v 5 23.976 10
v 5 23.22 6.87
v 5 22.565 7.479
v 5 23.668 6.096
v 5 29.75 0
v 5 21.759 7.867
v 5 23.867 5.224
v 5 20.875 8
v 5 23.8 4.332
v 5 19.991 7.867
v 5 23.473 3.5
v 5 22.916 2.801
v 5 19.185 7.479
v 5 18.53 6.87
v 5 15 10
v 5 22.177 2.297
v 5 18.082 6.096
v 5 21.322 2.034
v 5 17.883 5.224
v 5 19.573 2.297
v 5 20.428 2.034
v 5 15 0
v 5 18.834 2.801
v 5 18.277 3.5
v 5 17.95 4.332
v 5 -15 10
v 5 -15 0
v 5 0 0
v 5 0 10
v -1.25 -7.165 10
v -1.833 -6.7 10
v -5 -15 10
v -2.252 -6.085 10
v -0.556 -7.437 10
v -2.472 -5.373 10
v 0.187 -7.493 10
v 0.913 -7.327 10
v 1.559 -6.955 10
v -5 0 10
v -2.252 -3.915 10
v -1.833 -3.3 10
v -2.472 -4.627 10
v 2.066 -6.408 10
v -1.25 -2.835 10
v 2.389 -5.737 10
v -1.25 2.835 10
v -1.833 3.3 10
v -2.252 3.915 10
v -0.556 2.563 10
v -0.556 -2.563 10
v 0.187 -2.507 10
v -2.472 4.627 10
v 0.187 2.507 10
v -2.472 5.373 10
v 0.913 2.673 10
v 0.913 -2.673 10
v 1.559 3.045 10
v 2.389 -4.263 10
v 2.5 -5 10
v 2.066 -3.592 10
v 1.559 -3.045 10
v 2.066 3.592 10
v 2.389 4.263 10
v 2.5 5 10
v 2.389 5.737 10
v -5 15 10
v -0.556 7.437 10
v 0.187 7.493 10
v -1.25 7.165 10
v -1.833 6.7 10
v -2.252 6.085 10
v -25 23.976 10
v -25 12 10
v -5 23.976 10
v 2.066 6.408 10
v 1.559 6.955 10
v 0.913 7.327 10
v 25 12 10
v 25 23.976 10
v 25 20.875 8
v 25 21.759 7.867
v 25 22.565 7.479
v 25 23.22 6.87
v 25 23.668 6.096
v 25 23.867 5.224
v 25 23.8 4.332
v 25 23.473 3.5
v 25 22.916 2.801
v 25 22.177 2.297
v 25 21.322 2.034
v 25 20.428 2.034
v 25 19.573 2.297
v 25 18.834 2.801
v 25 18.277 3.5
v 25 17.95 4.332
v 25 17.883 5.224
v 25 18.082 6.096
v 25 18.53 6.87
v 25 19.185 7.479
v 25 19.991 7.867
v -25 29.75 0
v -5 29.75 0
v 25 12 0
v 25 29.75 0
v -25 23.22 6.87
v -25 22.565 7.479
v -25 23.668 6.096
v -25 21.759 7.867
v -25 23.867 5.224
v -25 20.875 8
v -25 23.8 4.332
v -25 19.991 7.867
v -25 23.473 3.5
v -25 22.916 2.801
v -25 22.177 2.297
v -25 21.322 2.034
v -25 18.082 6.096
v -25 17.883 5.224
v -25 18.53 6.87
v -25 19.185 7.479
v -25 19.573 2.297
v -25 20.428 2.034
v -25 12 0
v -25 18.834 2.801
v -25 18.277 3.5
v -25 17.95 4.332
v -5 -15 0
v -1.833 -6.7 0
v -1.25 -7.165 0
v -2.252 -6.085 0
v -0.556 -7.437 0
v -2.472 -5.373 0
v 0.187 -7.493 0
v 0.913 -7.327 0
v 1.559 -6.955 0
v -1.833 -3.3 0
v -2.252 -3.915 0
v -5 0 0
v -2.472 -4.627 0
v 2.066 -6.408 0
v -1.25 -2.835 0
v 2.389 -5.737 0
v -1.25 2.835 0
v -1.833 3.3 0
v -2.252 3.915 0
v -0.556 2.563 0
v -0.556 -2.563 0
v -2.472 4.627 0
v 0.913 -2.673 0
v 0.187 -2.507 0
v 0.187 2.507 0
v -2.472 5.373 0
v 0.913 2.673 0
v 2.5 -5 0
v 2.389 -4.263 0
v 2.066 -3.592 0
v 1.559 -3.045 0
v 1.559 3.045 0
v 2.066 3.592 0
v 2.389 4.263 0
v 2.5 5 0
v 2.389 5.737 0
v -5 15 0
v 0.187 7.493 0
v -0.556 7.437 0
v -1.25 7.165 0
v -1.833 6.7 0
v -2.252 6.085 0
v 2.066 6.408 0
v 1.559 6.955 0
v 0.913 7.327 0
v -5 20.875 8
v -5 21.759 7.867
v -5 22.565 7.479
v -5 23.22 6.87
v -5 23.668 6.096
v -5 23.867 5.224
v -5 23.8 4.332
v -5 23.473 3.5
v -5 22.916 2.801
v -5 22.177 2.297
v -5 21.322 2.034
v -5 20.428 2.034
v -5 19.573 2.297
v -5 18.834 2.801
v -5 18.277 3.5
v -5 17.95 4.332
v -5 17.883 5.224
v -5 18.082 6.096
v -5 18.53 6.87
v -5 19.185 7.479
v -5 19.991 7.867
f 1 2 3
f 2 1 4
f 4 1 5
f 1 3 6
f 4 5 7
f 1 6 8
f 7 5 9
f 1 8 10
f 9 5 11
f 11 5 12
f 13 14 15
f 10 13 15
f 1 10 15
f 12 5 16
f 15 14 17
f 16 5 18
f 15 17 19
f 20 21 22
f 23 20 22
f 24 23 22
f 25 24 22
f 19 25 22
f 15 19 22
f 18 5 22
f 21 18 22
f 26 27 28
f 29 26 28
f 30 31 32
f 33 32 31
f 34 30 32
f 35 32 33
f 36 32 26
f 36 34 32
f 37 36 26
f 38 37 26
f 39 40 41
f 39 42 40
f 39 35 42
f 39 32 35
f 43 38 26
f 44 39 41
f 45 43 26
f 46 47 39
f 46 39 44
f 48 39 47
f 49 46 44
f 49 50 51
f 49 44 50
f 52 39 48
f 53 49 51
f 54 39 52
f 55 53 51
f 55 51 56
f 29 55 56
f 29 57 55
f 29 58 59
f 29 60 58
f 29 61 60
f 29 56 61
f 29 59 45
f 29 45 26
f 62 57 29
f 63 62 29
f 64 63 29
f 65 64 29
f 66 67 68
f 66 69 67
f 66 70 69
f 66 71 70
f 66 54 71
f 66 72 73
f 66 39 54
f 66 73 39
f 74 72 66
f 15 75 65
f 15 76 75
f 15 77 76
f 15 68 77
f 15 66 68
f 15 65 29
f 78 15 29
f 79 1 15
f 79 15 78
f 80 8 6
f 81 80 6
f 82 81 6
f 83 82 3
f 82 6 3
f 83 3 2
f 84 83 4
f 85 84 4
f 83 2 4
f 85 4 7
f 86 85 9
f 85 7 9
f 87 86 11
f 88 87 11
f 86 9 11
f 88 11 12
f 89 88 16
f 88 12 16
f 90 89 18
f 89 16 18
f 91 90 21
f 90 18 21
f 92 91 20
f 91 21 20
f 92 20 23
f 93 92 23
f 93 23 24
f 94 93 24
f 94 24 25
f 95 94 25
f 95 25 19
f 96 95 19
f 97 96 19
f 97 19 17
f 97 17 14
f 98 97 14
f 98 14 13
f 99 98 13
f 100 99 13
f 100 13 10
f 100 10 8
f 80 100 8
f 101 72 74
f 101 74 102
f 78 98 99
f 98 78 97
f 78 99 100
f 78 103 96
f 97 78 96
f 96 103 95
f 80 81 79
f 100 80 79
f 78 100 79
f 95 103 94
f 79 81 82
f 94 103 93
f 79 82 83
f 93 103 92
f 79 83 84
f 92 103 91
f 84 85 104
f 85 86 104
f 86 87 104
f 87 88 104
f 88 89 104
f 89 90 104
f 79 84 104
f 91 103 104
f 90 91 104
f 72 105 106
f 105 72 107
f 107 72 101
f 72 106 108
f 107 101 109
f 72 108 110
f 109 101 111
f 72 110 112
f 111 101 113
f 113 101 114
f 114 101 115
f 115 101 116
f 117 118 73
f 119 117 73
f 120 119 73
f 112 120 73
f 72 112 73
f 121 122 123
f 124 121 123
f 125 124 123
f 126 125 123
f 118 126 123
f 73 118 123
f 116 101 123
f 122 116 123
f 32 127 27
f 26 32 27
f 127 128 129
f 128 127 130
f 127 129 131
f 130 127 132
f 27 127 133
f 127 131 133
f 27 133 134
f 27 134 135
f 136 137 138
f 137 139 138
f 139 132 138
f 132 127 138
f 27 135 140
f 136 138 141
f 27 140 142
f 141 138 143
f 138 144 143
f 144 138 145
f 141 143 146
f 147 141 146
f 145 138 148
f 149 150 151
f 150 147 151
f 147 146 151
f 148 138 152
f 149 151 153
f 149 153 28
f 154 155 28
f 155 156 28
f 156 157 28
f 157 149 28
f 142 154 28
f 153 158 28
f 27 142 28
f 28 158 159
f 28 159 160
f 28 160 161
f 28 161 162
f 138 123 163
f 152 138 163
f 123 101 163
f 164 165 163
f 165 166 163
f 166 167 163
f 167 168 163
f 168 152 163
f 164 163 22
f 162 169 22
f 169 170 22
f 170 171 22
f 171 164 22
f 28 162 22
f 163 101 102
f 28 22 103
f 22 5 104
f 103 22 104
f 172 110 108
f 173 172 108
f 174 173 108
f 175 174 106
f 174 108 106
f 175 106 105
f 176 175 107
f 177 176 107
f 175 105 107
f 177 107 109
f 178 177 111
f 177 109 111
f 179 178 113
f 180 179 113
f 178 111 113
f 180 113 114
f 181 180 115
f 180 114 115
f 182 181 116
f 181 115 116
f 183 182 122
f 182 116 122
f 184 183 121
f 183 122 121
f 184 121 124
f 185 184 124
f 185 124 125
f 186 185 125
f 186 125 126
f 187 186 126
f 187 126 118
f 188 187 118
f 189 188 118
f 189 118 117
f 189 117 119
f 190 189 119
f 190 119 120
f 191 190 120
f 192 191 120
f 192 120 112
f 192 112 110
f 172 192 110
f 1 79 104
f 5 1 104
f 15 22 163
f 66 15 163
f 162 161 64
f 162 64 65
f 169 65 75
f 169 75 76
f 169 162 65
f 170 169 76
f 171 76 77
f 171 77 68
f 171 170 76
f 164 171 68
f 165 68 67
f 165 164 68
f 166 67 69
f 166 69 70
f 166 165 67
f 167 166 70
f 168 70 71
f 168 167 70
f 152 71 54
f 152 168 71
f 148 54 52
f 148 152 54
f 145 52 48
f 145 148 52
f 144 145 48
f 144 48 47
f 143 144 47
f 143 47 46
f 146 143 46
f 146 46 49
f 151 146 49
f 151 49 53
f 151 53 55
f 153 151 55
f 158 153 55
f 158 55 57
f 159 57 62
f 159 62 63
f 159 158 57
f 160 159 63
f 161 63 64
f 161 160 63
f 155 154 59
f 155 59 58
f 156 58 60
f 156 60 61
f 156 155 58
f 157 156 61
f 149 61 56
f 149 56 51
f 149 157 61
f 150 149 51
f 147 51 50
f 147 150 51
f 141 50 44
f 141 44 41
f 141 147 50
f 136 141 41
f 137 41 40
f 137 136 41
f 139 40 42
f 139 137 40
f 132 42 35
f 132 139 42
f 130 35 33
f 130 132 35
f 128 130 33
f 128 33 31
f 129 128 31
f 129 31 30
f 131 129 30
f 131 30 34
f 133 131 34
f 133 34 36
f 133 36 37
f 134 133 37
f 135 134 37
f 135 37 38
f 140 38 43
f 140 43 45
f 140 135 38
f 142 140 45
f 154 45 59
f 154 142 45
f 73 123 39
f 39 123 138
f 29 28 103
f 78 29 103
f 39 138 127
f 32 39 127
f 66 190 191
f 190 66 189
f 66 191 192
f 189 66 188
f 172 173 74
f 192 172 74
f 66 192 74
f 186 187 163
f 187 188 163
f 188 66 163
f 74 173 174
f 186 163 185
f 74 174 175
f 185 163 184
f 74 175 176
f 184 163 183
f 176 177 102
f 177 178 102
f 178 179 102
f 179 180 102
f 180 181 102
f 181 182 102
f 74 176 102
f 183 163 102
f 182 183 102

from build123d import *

# Parameters (mm, degrees)
ESQUISSE1_R             = 2.5
BOSS_EXTRU_1_DEPTH      = 10
ENL_V_MAT_EXTRU_1_REACH = 61.034
ESQUISSE2_R             = 3


with BuildPart() as part:
    # Esquisse1 → Boss.-Extru.1 (new body)
    with BuildSketch(Plane.XY):
        Polygon((-25, 12), (-5, 0), (-5, -15), (5, -15), (5, 0), (25, 12), (25, 29.75), (5, 29.75), (5, 15), (-5, 15), (-5, 29.75), (-25, 29.75), align=None)
        with Locations((0, -5)):
            Circle(ESQUISSE1_R, mode=Mode.SUBTRACT)
        with Locations((0, 5)):
            Circle(ESQUISSE1_R, mode=Mode.SUBTRACT)
    extrude(amount=BOSS_EXTRU_1_DEPTH)

    # Enlèv. mat.-Extru.1: up to this face of the body (flat: up to its plane)
    enl_v_mat_extru_1_end = Plane(part.part.faces().sort_by_distance((25, 20.875, 5))[0])
    # Esquisse2 → Enlèv. mat.-Extru.1 (cut, up to the picked face)
    with BuildSketch(Plane.ZY.offset(25), mode=Mode.PRIVATE) as enl_v_mat_extru_1_sk1:
        with Locations((5, 20.875)):
            Circle(ESQUISSE2_R)
    enl_v_mat_extru_1_tool1 = split(extrude(enl_v_mat_extru_1_sk1.sketch, amount=-ENL_V_MAT_EXTRU_1_REACH, mode=Mode.PRIVATE), bisect_by=enl_v_mat_extru_1_end, keep=Keep.BOTH, mode=Mode.PRIVATE)
    # Esquisse2 → Enlèv. mat.-Extru.1 (cut, up to the picked face)
    with BuildSketch(Plane.ZY.offset(25), mode=Mode.PRIVATE) as enl_v_mat_extru_1_sk2:
        Polygon((0, 29.75), (10, 29.75), (10, 23.976497308), align=None)
    enl_v_mat_extru_1_tool2 = split(extrude(enl_v_mat_extru_1_sk2.sketch, amount=-ENL_V_MAT_EXTRU_1_REACH, mode=Mode.PRIVATE), bisect_by=enl_v_mat_extru_1_end, keep=Keep.BOTH, mode=Mode.PRIVATE)
    add(enl_v_mat_extru_1_tool1.solids().sort_by(Axis((-25, 20.875, 5), (1, 0, 0)))[0], mode=Mode.SUBTRACT)
    add(enl_v_mat_extru_1_tool2.solids().sort_by(Axis((-25, 27.825499, 6.666667), (1, 0, 0)))[0], mode=Mode.SUBTRACT)


solid = part.part
